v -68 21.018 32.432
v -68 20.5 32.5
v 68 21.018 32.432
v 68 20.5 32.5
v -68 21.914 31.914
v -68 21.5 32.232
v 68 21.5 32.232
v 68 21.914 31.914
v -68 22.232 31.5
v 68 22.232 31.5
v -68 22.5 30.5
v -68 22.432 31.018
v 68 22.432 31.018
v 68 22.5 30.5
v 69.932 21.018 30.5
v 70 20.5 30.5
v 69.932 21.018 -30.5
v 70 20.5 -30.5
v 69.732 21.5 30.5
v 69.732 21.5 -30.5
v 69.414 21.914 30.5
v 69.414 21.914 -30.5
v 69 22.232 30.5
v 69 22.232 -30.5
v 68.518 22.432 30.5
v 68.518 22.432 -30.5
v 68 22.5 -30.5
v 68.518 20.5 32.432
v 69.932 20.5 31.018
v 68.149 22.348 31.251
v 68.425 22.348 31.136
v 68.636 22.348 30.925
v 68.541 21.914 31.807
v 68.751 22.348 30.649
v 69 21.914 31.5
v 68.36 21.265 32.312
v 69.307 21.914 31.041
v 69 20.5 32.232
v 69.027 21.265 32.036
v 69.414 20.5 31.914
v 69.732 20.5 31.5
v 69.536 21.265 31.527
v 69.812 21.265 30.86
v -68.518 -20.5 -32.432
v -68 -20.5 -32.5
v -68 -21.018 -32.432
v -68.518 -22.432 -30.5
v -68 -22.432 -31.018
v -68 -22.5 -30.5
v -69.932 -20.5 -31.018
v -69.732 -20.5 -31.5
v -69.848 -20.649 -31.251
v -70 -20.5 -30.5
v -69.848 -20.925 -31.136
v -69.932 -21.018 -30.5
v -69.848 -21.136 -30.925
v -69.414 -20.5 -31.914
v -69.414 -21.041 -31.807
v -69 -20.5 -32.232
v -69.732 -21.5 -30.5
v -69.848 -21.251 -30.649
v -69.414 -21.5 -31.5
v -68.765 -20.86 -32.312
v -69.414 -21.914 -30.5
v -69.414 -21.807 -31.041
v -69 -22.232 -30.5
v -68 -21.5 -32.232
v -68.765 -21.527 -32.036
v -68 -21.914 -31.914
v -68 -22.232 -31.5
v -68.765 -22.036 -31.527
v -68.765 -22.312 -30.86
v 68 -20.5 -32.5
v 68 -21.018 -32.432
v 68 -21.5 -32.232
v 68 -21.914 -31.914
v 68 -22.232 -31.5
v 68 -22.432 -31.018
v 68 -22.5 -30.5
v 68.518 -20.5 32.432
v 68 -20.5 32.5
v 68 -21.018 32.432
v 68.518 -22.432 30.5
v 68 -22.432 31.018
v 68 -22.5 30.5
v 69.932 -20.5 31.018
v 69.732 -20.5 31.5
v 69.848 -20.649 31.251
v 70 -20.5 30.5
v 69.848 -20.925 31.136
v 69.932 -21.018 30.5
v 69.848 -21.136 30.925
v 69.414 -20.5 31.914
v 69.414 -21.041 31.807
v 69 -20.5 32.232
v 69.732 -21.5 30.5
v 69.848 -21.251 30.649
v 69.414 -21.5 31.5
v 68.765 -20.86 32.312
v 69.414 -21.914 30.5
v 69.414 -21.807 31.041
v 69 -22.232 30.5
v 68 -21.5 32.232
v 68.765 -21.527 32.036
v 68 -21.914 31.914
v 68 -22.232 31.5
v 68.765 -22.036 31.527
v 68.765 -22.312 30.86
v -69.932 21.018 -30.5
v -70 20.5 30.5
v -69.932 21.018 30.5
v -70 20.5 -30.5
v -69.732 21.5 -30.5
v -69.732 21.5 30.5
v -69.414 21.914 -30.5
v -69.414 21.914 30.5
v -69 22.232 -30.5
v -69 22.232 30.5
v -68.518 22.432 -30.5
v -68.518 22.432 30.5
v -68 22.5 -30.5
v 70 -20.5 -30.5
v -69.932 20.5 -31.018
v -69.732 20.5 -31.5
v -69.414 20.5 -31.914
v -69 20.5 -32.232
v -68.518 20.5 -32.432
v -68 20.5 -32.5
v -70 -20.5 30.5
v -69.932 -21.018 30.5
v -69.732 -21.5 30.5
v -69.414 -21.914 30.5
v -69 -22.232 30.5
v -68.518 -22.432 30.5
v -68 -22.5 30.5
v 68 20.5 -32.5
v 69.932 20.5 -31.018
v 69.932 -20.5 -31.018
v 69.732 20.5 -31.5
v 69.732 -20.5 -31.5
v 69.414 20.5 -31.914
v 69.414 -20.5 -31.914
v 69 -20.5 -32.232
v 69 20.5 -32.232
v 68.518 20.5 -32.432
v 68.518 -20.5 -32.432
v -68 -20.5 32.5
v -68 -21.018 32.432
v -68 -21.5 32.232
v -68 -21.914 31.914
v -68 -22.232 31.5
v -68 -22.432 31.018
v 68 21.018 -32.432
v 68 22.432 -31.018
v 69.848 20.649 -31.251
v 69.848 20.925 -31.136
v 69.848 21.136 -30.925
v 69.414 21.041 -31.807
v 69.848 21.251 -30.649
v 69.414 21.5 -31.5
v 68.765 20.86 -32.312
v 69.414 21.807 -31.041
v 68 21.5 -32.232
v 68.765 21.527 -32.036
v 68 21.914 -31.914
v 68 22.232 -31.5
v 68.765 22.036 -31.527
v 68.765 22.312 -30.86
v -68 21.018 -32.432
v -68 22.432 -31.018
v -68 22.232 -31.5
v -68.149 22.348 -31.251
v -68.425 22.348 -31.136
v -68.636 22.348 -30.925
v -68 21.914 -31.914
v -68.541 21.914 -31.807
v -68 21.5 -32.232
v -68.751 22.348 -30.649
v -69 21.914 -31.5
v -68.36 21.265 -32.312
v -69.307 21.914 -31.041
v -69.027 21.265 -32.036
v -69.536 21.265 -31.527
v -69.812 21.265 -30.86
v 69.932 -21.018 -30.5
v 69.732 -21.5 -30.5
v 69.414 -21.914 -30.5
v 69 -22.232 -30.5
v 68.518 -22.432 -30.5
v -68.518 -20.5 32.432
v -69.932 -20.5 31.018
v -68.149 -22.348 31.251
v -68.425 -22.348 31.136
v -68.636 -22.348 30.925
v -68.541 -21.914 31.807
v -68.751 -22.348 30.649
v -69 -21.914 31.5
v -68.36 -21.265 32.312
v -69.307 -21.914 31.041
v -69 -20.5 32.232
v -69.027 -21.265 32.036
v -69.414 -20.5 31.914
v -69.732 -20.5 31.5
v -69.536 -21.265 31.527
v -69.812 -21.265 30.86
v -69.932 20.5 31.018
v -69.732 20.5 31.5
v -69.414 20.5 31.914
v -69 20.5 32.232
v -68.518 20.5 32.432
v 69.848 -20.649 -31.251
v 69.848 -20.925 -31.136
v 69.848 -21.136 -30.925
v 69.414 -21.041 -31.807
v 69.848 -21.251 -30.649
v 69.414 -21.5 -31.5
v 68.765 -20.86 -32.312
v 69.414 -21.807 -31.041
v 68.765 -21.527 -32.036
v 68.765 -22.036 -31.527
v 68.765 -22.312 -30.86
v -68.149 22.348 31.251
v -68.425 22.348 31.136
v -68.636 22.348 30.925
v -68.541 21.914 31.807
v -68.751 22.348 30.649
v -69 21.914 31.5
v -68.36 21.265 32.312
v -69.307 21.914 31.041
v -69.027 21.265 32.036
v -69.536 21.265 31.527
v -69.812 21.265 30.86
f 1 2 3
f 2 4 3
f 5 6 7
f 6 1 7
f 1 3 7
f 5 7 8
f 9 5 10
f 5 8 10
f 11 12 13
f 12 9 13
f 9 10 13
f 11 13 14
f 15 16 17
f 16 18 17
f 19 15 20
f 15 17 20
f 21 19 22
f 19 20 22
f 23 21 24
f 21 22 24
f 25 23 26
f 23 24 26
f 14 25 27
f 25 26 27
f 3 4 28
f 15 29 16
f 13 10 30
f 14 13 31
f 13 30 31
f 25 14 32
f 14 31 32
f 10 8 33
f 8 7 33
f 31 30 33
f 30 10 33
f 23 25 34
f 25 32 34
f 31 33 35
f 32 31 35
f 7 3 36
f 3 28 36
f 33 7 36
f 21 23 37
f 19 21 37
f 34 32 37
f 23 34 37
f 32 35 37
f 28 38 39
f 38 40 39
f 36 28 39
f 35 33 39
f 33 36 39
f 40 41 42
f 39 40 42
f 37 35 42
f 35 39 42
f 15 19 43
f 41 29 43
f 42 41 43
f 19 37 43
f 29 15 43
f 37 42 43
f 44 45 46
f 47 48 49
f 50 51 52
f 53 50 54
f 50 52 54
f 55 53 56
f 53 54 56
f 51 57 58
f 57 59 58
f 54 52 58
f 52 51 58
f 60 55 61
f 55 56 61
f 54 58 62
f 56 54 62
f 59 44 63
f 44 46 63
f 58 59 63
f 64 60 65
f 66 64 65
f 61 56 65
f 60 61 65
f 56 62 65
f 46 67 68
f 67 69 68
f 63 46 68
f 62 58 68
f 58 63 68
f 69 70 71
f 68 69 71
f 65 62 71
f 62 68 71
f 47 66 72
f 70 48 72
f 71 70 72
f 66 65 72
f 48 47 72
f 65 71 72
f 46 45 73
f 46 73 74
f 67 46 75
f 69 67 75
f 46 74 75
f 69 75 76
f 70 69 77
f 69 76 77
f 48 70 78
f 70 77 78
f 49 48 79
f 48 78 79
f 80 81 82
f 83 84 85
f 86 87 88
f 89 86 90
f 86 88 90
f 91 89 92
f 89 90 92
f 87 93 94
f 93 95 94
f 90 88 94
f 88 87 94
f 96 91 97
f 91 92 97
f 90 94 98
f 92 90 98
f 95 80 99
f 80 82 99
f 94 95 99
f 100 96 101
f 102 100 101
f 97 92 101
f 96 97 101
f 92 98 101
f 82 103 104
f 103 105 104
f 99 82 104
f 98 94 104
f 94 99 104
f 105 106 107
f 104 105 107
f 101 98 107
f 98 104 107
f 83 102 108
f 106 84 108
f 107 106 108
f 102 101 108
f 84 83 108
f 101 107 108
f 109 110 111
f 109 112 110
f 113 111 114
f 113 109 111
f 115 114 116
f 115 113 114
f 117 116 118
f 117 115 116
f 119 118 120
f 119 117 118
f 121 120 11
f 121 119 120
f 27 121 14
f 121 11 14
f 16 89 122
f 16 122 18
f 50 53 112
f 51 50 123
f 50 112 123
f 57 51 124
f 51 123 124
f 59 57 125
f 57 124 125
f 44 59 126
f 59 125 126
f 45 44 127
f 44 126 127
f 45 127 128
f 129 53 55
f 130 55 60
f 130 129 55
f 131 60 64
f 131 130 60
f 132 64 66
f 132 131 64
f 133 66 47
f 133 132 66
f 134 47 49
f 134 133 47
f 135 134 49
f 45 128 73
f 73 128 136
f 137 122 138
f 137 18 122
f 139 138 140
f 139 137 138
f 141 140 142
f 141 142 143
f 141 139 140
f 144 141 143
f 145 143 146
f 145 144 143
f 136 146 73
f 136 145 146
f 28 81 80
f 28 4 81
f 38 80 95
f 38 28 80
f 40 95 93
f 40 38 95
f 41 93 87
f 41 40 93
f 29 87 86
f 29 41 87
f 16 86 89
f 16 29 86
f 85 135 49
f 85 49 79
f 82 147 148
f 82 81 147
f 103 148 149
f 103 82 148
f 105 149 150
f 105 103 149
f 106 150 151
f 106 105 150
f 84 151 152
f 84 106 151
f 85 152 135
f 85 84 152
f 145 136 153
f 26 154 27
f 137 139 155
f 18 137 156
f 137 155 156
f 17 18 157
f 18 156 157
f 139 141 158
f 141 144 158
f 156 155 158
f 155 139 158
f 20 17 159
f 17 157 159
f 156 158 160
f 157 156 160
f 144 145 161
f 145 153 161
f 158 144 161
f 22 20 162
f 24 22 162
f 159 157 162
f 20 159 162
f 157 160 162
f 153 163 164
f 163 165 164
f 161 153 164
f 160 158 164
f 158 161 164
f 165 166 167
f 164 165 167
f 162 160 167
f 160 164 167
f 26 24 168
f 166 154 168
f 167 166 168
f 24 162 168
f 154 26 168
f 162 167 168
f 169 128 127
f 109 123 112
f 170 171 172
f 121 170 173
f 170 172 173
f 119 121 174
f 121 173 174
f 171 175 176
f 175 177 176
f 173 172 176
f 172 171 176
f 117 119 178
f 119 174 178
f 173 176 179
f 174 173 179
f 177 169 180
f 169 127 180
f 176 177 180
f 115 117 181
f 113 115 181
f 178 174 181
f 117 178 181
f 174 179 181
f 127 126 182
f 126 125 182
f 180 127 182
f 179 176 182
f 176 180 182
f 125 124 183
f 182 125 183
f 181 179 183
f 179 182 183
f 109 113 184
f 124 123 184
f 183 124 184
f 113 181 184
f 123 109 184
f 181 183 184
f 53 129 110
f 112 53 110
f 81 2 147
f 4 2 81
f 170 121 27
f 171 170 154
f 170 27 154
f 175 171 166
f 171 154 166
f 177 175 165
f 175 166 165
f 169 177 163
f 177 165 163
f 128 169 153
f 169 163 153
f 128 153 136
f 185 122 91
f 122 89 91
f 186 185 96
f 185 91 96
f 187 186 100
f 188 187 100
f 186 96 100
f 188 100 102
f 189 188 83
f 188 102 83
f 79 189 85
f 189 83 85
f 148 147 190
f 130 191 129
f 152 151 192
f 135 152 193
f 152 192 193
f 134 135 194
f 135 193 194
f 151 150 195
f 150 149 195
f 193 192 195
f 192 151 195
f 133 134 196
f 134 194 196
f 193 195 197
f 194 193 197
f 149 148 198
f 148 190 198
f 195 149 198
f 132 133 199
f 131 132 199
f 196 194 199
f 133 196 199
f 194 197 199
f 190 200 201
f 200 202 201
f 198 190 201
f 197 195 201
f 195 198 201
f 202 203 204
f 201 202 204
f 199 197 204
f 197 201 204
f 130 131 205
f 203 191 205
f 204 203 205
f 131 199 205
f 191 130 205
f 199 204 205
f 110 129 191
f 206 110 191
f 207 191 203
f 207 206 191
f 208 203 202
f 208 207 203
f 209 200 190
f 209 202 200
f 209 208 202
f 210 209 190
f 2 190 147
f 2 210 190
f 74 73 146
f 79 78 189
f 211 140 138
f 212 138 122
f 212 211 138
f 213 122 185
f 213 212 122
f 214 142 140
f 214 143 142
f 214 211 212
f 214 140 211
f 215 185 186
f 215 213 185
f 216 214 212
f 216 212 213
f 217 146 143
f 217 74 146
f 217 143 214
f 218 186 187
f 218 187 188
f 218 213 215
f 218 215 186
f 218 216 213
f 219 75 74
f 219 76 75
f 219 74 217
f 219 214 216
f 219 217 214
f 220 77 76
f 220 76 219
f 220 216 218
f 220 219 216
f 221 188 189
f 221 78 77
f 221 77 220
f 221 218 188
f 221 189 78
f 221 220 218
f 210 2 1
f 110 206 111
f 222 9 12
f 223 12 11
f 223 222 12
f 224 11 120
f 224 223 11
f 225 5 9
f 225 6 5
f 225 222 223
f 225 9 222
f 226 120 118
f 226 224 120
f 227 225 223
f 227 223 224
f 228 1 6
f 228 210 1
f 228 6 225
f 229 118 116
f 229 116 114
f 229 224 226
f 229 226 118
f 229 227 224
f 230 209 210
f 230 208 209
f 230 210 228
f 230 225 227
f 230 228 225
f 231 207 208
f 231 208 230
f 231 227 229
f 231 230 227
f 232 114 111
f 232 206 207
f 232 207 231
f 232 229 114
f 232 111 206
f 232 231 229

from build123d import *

# Parameters (mm, degrees)
SCHIZZO1_W                   = 140
SCHIZZO1_H                   = 45
ESTRUSIONE_ESTRUSIONE1_DEPTH = 32.5
RACCORDO1_R                  = 2


with BuildPart() as part:
    # Schizzo1 → Estrusione-Estrusione1 (new body, symmetric)
    with BuildSketch(Plane.XY):
        Rectangle(SCHIZZO1_W, SCHIZZO1_H)
    extrude(amount=ESTRUSIONE_ESTRUSIONE1_DEPTH, both=True)

    # Raccordo1
    raccordo1_edges = [part.edges().sort_by_distance(p)[0] for p in [
        (-70, 0, 32.5),
        (0, -22.5, 32.5),
        (70, 0, 32.5),
        (0, -22.5, -32.5),
        (-70, 0, -32.5),
        (0, 22.5, -32.5),
        (70, 0, -32.5),
        (0, 22.5, 32.5),
        (70, -22.5, 0),
        (-70, -22.5, 0),
        (-70, 22.5, 0),
        (70, 22.5, 0),
    ]]
    fillet(raccordo1_edges, radius=RACCORDO1_R)


solid = part.part
